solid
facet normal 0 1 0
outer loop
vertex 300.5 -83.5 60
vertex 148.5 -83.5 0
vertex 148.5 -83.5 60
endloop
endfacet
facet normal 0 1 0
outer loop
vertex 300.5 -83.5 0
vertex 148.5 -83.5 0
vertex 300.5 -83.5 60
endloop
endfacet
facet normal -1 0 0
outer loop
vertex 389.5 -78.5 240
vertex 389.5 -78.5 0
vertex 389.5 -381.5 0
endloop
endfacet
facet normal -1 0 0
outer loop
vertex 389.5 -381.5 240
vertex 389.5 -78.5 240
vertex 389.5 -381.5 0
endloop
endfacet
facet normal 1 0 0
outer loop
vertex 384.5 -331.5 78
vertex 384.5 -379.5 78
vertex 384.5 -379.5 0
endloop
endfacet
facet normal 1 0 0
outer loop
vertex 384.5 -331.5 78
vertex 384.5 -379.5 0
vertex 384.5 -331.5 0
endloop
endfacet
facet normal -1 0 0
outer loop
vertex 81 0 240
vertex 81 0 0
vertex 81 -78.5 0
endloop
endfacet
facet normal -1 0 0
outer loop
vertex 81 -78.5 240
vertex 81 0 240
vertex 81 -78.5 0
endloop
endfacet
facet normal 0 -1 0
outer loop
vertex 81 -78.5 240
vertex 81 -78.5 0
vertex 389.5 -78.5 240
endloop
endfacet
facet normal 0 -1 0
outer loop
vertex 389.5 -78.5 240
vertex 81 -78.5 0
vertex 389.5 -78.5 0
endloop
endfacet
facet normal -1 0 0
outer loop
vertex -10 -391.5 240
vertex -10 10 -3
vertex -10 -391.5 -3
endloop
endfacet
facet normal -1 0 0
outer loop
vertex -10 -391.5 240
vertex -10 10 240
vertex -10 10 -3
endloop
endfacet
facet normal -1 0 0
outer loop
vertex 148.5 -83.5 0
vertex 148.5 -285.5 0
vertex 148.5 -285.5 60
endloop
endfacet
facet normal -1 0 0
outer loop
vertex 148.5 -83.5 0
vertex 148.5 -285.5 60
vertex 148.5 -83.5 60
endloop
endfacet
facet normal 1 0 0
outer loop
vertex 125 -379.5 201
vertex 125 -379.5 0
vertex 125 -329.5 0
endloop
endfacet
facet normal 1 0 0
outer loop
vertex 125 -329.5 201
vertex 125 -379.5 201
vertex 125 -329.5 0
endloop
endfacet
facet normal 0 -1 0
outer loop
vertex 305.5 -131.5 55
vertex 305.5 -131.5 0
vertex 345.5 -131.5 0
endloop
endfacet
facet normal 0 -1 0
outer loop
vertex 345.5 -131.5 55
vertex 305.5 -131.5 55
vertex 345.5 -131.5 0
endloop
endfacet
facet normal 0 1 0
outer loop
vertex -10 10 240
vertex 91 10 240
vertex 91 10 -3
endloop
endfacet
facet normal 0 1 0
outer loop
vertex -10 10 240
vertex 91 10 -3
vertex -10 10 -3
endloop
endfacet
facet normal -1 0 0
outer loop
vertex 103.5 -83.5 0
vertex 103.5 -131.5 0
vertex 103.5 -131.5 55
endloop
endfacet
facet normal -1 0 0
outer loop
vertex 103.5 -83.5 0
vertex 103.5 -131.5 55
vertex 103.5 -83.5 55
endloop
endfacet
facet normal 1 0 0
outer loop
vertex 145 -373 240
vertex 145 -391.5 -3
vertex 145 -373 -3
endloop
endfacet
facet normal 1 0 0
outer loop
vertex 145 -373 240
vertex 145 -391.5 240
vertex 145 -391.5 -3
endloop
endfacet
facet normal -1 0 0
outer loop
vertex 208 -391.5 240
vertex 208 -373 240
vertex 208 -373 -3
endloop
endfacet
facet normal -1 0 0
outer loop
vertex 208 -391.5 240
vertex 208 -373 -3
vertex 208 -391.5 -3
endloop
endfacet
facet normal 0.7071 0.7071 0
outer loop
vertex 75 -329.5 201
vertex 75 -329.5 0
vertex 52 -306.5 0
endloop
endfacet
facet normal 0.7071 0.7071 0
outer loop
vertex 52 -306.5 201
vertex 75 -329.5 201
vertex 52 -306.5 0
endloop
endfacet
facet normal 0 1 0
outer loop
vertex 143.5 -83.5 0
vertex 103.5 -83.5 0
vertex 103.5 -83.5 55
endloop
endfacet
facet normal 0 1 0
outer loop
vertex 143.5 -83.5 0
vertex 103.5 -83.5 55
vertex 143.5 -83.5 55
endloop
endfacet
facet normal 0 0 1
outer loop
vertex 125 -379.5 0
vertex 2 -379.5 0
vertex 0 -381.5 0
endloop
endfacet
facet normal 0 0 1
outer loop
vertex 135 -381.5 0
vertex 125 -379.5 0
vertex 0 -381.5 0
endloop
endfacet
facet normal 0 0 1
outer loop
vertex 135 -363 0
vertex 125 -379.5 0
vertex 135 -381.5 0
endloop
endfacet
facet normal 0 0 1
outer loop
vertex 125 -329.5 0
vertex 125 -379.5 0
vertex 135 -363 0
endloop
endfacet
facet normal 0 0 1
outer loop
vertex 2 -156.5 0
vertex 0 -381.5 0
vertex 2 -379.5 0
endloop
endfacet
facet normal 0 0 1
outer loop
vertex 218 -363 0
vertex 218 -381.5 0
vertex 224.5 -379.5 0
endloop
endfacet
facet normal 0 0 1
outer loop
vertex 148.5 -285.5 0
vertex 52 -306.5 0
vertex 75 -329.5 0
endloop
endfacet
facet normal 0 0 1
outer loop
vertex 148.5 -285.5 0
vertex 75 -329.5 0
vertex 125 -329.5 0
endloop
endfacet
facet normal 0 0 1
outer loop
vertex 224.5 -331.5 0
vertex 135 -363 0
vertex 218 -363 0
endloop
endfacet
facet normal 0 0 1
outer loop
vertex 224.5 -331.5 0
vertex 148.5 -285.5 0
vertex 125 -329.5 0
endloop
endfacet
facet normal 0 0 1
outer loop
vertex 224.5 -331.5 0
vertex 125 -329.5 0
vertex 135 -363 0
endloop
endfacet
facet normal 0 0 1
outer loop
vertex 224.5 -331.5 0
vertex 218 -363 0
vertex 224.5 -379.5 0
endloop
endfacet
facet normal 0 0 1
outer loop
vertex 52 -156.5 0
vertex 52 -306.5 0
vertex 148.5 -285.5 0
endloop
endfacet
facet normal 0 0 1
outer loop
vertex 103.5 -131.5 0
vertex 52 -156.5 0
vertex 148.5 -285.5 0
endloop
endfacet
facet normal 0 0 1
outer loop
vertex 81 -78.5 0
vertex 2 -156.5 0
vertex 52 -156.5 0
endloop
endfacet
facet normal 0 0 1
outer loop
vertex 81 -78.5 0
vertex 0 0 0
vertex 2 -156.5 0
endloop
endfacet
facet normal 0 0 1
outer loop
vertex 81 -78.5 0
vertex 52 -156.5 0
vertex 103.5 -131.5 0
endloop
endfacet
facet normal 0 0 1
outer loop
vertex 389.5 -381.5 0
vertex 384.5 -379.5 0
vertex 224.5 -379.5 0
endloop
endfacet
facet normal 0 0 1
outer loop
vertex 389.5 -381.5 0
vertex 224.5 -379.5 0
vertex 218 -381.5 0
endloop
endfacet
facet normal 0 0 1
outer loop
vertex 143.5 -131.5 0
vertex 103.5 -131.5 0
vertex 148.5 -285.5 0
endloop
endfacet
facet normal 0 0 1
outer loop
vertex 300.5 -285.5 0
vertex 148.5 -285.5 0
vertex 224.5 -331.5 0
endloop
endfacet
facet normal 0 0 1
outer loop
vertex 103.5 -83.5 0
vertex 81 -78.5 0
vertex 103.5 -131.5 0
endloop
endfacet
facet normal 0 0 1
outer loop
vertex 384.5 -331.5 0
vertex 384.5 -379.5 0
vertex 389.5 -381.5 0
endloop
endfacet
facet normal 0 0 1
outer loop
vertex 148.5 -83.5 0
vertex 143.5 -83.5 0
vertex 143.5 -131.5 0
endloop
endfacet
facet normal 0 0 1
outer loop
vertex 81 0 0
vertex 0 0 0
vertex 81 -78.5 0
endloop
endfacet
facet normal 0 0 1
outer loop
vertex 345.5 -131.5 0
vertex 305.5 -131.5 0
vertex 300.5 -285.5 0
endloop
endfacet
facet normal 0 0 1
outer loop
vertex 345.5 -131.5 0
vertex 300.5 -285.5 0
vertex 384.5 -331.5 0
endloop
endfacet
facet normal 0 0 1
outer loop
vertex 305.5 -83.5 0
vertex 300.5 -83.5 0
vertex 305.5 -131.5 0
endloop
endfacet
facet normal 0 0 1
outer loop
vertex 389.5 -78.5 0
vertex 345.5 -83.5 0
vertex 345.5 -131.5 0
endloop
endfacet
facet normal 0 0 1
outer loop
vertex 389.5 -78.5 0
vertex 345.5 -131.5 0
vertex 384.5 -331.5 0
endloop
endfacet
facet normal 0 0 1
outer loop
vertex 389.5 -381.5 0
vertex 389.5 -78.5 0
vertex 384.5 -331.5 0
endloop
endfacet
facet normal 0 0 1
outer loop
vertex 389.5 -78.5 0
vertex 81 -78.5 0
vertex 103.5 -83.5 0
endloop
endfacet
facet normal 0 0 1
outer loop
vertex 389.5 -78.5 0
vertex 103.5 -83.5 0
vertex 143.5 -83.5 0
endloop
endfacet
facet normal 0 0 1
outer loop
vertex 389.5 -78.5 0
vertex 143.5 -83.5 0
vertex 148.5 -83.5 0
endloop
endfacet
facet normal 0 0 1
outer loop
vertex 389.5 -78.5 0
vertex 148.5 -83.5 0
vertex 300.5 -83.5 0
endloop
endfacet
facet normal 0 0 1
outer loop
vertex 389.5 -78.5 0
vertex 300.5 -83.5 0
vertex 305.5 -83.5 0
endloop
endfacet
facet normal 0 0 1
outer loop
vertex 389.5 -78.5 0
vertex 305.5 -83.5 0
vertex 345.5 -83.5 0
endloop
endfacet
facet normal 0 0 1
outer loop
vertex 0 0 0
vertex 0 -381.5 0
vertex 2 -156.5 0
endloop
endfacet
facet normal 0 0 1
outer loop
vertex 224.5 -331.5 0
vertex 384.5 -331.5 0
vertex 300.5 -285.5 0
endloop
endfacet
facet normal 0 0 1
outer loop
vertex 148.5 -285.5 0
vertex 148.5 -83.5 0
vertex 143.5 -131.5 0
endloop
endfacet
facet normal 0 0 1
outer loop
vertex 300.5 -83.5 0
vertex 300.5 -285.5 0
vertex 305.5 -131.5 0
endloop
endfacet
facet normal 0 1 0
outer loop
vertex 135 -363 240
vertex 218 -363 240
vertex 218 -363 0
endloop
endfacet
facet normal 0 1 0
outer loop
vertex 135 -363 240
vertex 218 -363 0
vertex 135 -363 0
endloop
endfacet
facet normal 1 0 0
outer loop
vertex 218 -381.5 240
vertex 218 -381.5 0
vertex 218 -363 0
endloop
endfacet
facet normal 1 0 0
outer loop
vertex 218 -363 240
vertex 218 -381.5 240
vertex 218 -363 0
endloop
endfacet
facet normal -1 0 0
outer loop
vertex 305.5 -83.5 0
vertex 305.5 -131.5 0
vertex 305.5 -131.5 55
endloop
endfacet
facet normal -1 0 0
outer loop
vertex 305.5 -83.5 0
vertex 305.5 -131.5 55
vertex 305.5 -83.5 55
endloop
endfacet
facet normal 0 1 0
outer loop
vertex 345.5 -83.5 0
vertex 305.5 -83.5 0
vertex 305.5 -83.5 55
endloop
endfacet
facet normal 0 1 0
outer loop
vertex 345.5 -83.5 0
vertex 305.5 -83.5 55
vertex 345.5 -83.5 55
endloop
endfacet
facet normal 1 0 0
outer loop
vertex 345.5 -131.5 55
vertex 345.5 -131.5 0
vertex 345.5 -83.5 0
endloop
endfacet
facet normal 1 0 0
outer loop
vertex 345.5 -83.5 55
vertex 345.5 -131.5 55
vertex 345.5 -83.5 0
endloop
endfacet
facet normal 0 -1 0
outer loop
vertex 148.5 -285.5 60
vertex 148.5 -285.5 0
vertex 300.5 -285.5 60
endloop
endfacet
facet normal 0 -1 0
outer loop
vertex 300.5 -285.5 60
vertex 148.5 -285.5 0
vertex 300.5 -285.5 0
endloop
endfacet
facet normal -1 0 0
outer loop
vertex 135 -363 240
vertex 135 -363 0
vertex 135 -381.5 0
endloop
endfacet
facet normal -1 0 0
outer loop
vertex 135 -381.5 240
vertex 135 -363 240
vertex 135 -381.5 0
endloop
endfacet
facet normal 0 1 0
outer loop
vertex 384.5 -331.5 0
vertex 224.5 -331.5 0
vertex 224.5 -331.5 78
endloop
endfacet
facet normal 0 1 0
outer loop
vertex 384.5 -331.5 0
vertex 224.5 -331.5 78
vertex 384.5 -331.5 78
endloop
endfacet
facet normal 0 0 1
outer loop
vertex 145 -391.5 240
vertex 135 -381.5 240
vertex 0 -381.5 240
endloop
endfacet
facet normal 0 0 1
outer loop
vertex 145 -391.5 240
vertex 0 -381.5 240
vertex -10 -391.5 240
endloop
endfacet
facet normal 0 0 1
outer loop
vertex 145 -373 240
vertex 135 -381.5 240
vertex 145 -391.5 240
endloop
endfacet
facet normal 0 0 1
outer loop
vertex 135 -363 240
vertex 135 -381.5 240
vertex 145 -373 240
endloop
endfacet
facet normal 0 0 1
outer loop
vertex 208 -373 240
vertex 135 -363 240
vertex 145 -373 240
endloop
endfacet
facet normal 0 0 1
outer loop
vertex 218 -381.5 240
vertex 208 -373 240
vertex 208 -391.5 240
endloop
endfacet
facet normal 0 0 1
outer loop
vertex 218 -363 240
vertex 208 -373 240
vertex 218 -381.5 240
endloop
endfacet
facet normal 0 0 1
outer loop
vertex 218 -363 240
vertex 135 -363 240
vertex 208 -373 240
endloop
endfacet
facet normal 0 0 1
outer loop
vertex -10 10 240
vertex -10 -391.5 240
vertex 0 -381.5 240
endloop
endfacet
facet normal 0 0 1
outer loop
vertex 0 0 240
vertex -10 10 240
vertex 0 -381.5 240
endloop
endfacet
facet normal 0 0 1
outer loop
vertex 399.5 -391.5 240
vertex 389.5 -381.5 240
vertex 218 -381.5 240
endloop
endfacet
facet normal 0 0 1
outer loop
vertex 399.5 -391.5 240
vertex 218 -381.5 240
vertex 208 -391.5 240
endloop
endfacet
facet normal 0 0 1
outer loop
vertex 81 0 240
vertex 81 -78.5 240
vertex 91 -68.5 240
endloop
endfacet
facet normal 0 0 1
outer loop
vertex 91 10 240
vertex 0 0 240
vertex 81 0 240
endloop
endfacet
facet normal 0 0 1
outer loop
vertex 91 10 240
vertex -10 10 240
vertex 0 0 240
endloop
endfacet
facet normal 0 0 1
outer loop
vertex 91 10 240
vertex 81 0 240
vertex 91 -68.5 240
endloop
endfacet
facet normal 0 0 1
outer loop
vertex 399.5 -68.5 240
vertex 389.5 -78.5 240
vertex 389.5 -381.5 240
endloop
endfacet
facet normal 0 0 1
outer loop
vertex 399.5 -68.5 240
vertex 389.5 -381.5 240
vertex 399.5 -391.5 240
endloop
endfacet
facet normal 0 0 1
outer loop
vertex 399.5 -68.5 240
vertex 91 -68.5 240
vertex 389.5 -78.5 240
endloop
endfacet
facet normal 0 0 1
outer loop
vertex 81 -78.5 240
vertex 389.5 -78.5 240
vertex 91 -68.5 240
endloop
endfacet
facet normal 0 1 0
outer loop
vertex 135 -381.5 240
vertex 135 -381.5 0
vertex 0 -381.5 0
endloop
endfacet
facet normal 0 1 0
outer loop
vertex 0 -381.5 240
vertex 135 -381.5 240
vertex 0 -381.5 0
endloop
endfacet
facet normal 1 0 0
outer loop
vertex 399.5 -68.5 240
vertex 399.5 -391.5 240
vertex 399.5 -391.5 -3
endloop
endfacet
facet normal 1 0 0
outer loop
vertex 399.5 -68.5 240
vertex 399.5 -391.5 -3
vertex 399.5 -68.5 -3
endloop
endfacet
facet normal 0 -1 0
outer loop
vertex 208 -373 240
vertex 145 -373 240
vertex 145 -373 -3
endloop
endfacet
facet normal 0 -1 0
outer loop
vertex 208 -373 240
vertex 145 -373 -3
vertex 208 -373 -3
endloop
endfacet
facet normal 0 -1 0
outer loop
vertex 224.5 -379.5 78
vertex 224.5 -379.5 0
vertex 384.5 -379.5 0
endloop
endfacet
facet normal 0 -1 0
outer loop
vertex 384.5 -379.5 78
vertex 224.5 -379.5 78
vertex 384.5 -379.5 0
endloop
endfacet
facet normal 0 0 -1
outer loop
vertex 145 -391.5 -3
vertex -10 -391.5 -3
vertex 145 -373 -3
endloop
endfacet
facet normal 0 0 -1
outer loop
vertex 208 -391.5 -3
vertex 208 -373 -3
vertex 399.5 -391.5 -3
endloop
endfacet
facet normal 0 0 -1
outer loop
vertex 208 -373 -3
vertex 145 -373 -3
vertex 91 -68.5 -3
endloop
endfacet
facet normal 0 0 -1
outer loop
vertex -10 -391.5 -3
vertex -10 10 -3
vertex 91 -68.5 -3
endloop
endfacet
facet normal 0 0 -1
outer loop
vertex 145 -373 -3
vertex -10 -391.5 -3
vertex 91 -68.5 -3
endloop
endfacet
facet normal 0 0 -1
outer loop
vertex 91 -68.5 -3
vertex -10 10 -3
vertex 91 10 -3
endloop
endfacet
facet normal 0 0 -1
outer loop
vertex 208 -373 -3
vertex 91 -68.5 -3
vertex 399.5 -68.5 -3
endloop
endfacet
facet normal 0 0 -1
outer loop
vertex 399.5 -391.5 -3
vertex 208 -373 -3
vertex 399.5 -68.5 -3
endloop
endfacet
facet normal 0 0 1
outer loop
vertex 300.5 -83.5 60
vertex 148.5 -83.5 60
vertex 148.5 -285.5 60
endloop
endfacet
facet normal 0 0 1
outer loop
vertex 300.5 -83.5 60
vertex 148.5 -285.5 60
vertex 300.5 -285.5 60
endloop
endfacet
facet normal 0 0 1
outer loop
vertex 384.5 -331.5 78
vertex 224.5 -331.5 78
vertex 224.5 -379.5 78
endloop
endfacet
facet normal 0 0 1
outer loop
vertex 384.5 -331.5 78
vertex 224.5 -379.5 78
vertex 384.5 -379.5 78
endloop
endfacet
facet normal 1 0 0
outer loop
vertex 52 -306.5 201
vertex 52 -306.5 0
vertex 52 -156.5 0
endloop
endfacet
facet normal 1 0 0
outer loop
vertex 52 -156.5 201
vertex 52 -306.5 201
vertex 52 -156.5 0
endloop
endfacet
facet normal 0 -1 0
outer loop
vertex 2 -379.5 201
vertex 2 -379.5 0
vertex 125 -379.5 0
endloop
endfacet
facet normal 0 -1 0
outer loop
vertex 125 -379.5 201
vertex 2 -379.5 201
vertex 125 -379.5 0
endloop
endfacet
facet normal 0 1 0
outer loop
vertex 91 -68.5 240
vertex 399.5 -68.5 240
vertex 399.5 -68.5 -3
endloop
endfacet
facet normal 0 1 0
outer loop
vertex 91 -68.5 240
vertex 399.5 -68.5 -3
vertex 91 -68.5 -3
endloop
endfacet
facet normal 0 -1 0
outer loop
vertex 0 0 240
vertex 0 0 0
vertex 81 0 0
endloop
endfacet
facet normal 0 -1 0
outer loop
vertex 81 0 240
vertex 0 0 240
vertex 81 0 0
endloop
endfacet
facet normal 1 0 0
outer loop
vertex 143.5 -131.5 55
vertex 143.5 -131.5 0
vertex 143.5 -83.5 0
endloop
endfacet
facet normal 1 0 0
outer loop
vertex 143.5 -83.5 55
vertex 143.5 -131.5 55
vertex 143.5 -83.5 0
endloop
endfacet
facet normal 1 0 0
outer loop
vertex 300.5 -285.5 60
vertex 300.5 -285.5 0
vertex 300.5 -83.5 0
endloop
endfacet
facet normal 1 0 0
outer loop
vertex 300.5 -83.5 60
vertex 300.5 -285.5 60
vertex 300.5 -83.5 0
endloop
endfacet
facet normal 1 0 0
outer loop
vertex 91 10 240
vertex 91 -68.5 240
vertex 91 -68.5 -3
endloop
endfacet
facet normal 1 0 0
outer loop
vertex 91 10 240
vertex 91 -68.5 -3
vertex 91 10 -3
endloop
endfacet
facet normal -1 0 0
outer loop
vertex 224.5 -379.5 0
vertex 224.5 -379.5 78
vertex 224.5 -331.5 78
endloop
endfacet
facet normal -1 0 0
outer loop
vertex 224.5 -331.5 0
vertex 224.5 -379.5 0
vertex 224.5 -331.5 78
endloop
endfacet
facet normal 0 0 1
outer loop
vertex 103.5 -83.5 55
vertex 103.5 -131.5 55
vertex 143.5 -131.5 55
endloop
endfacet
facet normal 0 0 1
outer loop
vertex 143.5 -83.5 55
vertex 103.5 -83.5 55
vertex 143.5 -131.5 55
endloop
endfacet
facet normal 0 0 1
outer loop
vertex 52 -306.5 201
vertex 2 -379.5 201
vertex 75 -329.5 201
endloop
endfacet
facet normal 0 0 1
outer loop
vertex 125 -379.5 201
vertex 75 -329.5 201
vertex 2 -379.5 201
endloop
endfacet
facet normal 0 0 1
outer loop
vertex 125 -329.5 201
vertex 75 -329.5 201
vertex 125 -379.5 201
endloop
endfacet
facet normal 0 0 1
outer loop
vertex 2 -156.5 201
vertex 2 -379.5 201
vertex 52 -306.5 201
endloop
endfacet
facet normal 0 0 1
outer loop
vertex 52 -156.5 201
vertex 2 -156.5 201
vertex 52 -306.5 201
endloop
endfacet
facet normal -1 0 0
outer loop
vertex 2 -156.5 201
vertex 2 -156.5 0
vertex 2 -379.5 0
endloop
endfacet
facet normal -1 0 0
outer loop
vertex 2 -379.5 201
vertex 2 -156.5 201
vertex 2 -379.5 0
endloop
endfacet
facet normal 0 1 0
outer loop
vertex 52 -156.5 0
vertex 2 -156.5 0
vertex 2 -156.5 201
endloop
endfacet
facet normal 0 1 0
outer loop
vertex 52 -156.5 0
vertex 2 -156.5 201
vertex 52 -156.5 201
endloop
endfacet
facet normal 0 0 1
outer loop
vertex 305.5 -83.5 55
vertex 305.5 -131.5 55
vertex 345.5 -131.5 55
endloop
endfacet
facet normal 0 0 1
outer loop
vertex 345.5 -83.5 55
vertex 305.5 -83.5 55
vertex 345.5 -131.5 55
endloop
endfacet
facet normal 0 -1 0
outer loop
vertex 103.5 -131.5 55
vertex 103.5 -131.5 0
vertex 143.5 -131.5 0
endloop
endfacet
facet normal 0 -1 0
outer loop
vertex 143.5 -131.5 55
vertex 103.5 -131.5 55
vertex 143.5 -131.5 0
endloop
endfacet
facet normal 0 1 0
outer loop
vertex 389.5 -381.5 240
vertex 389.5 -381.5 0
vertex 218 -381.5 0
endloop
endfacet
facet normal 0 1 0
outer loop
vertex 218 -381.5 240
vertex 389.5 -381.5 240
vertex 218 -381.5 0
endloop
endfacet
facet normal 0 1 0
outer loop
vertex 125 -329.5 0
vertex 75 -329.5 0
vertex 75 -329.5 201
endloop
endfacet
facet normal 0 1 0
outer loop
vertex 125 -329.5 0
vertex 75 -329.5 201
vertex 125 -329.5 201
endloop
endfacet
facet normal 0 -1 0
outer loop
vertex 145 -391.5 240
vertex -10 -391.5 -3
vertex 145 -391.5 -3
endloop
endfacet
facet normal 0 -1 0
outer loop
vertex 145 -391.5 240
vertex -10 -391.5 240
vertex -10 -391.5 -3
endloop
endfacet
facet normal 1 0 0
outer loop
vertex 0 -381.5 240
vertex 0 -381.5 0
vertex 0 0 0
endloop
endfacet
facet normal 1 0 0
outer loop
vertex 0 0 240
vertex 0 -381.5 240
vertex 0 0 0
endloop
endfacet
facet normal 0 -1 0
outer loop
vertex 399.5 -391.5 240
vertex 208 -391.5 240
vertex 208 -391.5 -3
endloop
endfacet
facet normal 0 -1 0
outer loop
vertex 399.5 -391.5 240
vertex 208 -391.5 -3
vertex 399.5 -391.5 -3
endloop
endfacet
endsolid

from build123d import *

# Parameters (mm, degrees)
F1_DEPTH = 240
F0_W     = 160
F0_H     = 48
F0_W_2   = 40
F0_W_3   = 152
F0_H_2   = 202
F0_W_4   = 50
F0_H_3   = 150
F0_H_4   = 50
F2_DEPTH = 3
F3_DEPTH = 201
F4_DEPTH = 55
F5_DEPTH = 60
F6_DEPTH = 78


with BuildPart() as f1:
    # F0 (on Top) → F1 (new body)
    with BuildSketch(Plane.XY):
        Polygon((145, -391.5), (145, -373), (208, -373), (208, -391.5), (399.5, -391.5), (399.5, -68.5), (91, -68.5), (91, 10), (-10, 10), (-10, -391.5), align=None)
        Polygon((0, -381.5), (0, 0), (81, 0), (81, -78.5), (389.5, -78.5), (389.5, -381.5), (218, -381.5), (218, -363), (135, -363), (135, -381.5), align=None, mode=Mode.SUBTRACT)
    extrude(amount=F1_DEPTH)

    # F0 (on Top) → F2 (join)
    with BuildSketch(Plane.XY):
        Polygon((145, -391.5), (145, -373), (208, -373), (208, -391.5), (399.5, -391.5), (399.5, -68.5), (91, -68.5), (91, 10), (-10, 10), (-10, -391.5), align=None)
        Polygon((0, -381.5), (0, 0), (81, 0), (81, -78.5), (389.5, -78.5), (389.5, -381.5), (218, -381.5), (218, -363), (135, -363), (135, -381.5), align=None, mode=Mode.SUBTRACT)
        Polygon((81, 0), (0, 0), (0, -381.5), (135, -381.5), (135, -363), (218, -363), (218, -381.5), (389.5, -381.5), (389.5, -78.5), (81, -78.5), align=None)
        Polygon((2, -306.5), (2, -156.5), (52, -156.5), (52, -306.5), (75, -329.5), (125, -329.5), (125, -379.5), (75, -379.5), (2, -379.5), align=None, mode=Mode.SUBTRACT)
        with Locations((304.5, -355.5)):
            Rectangle(F0_W, F0_H, mode=Mode.SUBTRACT)
        with Locations((123.5, -107.5)):
            Rectangle(F0_W_2, F0_H, mode=Mode.SUBTRACT)
        with Locations((224.5, -184.5)):
            Rectangle(F0_W_3, F0_H_2, mode=Mode.SUBTRACT)
        with Locations((325.5, -107.5)):
            Rectangle(F0_W_2, F0_H, mode=Mode.SUBTRACT)
        with Locations((27, -231.5)):
            Rectangle(F0_W_4, F0_H_3)
        with Locations((224.5, -184.5)):
            Rectangle(F0_W_3, F0_H_2)
        with Locations((123.5, -107.5)):
            Rectangle(F0_W_2, F0_H)
        with Locations((325.5, -107.5)):
            Rectangle(F0_W_2, F0_H)
        with Locations((304.5, -355.5)):
            Rectangle(F0_W, F0_H)
        Polygon((52, -306.5), (2, -306.5), (2, -379.5), (75, -379.5), (75, -329.5), align=None)
        with Locations((100, -354.5)):
            Rectangle(F0_W_4, F0_H_4)
    extrude(amount=-F2_DEPTH)

    # F0 (on Top) → F3 (join)
    with BuildSketch(Plane.XY):
        with Locations((27, -231.5)):
            Rectangle(F0_W_4, F0_H_3)
        Polygon((52, -306.5), (2, -306.5), (2, -379.5), (75, -379.5), (75, -329.5), align=None)
        with Locations((100, -354.5)):
            Rectangle(F0_W_4, F0_H_4)
    extrude(amount=F3_DEPTH)

    # F0 (on Top) → F4 (join)
    with BuildSketch(Plane.XY):
        with Locations((123.5, -107.5)):
            Rectangle(F0_W_2, F0_H)
        with Locations((325.5, -107.5)):
            Rectangle(F0_W_2, F0_H)
    extrude(amount=F4_DEPTH)

    # F0 (on Top) → F5 (join)
    with BuildSketch(Plane.XY):
        with Locations((224.5, -184.5)):
            Rectangle(F0_W_3, F0_H_2)
    extrude(amount=F5_DEPTH)

    # F0 (on Top) → F6 (join)
    with BuildSketch(Plane.XY):
        with Locations((304.5, -355.5)):
            Rectangle(F0_W, F0_H)
    extrude(amount=F6_DEPTH)


solid = f1.part
